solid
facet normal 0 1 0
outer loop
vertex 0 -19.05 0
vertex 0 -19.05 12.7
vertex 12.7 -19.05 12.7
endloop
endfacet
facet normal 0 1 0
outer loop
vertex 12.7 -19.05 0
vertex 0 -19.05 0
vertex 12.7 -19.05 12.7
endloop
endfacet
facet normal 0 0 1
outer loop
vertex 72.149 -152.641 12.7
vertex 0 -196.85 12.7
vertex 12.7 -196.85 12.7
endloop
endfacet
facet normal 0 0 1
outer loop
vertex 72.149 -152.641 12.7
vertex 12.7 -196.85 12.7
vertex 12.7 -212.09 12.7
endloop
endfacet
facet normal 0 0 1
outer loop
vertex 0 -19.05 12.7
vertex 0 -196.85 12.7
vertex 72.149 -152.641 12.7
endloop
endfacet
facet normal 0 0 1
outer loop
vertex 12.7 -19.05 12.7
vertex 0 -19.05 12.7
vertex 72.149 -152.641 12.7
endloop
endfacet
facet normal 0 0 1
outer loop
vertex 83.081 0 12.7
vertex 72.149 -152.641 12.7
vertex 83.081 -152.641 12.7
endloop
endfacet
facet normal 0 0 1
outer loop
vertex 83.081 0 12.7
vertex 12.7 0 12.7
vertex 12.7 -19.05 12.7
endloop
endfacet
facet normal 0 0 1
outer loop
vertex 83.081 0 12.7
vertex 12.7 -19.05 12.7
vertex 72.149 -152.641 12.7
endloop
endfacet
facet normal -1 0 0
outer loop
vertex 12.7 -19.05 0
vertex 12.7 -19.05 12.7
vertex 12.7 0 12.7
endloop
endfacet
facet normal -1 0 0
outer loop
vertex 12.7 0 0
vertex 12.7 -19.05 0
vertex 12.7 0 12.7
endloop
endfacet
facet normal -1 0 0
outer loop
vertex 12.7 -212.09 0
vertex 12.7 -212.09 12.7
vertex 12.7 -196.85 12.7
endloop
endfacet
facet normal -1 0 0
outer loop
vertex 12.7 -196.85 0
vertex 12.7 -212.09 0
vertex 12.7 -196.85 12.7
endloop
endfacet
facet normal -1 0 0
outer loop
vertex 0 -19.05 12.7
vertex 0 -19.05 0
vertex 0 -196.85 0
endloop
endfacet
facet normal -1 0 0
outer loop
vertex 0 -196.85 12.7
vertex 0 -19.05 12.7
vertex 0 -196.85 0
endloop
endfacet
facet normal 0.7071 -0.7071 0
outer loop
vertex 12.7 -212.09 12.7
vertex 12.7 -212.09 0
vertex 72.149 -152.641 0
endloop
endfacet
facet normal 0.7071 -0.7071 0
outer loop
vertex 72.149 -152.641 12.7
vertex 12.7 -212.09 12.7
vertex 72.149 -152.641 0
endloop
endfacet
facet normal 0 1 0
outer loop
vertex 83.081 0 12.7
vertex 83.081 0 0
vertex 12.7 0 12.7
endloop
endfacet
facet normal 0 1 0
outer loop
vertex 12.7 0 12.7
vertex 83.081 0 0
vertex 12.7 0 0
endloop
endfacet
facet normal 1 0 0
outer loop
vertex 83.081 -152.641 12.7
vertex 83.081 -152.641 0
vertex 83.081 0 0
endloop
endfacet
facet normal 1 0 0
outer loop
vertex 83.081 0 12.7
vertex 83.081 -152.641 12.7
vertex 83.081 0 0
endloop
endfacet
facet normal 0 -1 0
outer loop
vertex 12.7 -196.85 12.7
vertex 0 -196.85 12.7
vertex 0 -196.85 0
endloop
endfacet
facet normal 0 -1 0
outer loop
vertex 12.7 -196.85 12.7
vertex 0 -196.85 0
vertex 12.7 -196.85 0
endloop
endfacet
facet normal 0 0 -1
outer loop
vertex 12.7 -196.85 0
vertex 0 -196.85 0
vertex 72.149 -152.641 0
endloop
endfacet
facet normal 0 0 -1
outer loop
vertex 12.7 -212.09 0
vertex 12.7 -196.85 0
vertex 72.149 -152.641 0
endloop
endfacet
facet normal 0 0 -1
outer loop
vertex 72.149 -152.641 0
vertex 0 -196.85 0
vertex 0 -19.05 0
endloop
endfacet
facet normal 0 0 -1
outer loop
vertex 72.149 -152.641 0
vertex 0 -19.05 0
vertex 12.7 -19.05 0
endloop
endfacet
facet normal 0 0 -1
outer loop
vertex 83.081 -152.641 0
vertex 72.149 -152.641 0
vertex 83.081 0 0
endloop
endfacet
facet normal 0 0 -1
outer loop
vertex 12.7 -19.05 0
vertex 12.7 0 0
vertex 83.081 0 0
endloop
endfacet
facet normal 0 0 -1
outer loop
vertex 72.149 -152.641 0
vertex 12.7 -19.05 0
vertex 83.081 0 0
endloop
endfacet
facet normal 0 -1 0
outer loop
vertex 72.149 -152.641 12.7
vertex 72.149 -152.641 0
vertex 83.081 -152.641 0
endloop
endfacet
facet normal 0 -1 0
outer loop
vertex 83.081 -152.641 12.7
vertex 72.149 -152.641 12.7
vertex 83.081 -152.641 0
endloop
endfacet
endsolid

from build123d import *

# Parameters (mm, degrees)
BOSS_EXTRUDE1_DEPTH = 12.7
SKETCH2_W           = 12.7
SKETCH2_H           = 19.05
CUT_EXTRUDE1_DEPTH  = 13.7


with BuildPart() as part:
    # Sketch1 → Boss-Extrude1 (new body)
    with BuildSketch(Plane.XY):
        Polygon((0, -215.9), (8.89, -215.9), (72.148675035, -152.641324965), (83.080541238, -152.641324965), (83.080541238, 0), (76.730541238, 0), (0, 0), align=None)
    extrude(amount=BOSS_EXTRUDE1_DEPTH)

    # Sketch2 → Cut-Extrude1 (cut, through all)
    with BuildSketch(Plane.XY.offset(12.7)):
        with Locations((6.35, -9.525)):
            Rectangle(SKETCH2_W, SKETCH2_H)
        with Locations((6.35, -206.375)):
            Rectangle(SKETCH2_W, SKETCH2_H)
    extrude(amount=-CUT_EXTRUDE1_DEPTH, mode=Mode.SUBTRACT)


solid = part.part
